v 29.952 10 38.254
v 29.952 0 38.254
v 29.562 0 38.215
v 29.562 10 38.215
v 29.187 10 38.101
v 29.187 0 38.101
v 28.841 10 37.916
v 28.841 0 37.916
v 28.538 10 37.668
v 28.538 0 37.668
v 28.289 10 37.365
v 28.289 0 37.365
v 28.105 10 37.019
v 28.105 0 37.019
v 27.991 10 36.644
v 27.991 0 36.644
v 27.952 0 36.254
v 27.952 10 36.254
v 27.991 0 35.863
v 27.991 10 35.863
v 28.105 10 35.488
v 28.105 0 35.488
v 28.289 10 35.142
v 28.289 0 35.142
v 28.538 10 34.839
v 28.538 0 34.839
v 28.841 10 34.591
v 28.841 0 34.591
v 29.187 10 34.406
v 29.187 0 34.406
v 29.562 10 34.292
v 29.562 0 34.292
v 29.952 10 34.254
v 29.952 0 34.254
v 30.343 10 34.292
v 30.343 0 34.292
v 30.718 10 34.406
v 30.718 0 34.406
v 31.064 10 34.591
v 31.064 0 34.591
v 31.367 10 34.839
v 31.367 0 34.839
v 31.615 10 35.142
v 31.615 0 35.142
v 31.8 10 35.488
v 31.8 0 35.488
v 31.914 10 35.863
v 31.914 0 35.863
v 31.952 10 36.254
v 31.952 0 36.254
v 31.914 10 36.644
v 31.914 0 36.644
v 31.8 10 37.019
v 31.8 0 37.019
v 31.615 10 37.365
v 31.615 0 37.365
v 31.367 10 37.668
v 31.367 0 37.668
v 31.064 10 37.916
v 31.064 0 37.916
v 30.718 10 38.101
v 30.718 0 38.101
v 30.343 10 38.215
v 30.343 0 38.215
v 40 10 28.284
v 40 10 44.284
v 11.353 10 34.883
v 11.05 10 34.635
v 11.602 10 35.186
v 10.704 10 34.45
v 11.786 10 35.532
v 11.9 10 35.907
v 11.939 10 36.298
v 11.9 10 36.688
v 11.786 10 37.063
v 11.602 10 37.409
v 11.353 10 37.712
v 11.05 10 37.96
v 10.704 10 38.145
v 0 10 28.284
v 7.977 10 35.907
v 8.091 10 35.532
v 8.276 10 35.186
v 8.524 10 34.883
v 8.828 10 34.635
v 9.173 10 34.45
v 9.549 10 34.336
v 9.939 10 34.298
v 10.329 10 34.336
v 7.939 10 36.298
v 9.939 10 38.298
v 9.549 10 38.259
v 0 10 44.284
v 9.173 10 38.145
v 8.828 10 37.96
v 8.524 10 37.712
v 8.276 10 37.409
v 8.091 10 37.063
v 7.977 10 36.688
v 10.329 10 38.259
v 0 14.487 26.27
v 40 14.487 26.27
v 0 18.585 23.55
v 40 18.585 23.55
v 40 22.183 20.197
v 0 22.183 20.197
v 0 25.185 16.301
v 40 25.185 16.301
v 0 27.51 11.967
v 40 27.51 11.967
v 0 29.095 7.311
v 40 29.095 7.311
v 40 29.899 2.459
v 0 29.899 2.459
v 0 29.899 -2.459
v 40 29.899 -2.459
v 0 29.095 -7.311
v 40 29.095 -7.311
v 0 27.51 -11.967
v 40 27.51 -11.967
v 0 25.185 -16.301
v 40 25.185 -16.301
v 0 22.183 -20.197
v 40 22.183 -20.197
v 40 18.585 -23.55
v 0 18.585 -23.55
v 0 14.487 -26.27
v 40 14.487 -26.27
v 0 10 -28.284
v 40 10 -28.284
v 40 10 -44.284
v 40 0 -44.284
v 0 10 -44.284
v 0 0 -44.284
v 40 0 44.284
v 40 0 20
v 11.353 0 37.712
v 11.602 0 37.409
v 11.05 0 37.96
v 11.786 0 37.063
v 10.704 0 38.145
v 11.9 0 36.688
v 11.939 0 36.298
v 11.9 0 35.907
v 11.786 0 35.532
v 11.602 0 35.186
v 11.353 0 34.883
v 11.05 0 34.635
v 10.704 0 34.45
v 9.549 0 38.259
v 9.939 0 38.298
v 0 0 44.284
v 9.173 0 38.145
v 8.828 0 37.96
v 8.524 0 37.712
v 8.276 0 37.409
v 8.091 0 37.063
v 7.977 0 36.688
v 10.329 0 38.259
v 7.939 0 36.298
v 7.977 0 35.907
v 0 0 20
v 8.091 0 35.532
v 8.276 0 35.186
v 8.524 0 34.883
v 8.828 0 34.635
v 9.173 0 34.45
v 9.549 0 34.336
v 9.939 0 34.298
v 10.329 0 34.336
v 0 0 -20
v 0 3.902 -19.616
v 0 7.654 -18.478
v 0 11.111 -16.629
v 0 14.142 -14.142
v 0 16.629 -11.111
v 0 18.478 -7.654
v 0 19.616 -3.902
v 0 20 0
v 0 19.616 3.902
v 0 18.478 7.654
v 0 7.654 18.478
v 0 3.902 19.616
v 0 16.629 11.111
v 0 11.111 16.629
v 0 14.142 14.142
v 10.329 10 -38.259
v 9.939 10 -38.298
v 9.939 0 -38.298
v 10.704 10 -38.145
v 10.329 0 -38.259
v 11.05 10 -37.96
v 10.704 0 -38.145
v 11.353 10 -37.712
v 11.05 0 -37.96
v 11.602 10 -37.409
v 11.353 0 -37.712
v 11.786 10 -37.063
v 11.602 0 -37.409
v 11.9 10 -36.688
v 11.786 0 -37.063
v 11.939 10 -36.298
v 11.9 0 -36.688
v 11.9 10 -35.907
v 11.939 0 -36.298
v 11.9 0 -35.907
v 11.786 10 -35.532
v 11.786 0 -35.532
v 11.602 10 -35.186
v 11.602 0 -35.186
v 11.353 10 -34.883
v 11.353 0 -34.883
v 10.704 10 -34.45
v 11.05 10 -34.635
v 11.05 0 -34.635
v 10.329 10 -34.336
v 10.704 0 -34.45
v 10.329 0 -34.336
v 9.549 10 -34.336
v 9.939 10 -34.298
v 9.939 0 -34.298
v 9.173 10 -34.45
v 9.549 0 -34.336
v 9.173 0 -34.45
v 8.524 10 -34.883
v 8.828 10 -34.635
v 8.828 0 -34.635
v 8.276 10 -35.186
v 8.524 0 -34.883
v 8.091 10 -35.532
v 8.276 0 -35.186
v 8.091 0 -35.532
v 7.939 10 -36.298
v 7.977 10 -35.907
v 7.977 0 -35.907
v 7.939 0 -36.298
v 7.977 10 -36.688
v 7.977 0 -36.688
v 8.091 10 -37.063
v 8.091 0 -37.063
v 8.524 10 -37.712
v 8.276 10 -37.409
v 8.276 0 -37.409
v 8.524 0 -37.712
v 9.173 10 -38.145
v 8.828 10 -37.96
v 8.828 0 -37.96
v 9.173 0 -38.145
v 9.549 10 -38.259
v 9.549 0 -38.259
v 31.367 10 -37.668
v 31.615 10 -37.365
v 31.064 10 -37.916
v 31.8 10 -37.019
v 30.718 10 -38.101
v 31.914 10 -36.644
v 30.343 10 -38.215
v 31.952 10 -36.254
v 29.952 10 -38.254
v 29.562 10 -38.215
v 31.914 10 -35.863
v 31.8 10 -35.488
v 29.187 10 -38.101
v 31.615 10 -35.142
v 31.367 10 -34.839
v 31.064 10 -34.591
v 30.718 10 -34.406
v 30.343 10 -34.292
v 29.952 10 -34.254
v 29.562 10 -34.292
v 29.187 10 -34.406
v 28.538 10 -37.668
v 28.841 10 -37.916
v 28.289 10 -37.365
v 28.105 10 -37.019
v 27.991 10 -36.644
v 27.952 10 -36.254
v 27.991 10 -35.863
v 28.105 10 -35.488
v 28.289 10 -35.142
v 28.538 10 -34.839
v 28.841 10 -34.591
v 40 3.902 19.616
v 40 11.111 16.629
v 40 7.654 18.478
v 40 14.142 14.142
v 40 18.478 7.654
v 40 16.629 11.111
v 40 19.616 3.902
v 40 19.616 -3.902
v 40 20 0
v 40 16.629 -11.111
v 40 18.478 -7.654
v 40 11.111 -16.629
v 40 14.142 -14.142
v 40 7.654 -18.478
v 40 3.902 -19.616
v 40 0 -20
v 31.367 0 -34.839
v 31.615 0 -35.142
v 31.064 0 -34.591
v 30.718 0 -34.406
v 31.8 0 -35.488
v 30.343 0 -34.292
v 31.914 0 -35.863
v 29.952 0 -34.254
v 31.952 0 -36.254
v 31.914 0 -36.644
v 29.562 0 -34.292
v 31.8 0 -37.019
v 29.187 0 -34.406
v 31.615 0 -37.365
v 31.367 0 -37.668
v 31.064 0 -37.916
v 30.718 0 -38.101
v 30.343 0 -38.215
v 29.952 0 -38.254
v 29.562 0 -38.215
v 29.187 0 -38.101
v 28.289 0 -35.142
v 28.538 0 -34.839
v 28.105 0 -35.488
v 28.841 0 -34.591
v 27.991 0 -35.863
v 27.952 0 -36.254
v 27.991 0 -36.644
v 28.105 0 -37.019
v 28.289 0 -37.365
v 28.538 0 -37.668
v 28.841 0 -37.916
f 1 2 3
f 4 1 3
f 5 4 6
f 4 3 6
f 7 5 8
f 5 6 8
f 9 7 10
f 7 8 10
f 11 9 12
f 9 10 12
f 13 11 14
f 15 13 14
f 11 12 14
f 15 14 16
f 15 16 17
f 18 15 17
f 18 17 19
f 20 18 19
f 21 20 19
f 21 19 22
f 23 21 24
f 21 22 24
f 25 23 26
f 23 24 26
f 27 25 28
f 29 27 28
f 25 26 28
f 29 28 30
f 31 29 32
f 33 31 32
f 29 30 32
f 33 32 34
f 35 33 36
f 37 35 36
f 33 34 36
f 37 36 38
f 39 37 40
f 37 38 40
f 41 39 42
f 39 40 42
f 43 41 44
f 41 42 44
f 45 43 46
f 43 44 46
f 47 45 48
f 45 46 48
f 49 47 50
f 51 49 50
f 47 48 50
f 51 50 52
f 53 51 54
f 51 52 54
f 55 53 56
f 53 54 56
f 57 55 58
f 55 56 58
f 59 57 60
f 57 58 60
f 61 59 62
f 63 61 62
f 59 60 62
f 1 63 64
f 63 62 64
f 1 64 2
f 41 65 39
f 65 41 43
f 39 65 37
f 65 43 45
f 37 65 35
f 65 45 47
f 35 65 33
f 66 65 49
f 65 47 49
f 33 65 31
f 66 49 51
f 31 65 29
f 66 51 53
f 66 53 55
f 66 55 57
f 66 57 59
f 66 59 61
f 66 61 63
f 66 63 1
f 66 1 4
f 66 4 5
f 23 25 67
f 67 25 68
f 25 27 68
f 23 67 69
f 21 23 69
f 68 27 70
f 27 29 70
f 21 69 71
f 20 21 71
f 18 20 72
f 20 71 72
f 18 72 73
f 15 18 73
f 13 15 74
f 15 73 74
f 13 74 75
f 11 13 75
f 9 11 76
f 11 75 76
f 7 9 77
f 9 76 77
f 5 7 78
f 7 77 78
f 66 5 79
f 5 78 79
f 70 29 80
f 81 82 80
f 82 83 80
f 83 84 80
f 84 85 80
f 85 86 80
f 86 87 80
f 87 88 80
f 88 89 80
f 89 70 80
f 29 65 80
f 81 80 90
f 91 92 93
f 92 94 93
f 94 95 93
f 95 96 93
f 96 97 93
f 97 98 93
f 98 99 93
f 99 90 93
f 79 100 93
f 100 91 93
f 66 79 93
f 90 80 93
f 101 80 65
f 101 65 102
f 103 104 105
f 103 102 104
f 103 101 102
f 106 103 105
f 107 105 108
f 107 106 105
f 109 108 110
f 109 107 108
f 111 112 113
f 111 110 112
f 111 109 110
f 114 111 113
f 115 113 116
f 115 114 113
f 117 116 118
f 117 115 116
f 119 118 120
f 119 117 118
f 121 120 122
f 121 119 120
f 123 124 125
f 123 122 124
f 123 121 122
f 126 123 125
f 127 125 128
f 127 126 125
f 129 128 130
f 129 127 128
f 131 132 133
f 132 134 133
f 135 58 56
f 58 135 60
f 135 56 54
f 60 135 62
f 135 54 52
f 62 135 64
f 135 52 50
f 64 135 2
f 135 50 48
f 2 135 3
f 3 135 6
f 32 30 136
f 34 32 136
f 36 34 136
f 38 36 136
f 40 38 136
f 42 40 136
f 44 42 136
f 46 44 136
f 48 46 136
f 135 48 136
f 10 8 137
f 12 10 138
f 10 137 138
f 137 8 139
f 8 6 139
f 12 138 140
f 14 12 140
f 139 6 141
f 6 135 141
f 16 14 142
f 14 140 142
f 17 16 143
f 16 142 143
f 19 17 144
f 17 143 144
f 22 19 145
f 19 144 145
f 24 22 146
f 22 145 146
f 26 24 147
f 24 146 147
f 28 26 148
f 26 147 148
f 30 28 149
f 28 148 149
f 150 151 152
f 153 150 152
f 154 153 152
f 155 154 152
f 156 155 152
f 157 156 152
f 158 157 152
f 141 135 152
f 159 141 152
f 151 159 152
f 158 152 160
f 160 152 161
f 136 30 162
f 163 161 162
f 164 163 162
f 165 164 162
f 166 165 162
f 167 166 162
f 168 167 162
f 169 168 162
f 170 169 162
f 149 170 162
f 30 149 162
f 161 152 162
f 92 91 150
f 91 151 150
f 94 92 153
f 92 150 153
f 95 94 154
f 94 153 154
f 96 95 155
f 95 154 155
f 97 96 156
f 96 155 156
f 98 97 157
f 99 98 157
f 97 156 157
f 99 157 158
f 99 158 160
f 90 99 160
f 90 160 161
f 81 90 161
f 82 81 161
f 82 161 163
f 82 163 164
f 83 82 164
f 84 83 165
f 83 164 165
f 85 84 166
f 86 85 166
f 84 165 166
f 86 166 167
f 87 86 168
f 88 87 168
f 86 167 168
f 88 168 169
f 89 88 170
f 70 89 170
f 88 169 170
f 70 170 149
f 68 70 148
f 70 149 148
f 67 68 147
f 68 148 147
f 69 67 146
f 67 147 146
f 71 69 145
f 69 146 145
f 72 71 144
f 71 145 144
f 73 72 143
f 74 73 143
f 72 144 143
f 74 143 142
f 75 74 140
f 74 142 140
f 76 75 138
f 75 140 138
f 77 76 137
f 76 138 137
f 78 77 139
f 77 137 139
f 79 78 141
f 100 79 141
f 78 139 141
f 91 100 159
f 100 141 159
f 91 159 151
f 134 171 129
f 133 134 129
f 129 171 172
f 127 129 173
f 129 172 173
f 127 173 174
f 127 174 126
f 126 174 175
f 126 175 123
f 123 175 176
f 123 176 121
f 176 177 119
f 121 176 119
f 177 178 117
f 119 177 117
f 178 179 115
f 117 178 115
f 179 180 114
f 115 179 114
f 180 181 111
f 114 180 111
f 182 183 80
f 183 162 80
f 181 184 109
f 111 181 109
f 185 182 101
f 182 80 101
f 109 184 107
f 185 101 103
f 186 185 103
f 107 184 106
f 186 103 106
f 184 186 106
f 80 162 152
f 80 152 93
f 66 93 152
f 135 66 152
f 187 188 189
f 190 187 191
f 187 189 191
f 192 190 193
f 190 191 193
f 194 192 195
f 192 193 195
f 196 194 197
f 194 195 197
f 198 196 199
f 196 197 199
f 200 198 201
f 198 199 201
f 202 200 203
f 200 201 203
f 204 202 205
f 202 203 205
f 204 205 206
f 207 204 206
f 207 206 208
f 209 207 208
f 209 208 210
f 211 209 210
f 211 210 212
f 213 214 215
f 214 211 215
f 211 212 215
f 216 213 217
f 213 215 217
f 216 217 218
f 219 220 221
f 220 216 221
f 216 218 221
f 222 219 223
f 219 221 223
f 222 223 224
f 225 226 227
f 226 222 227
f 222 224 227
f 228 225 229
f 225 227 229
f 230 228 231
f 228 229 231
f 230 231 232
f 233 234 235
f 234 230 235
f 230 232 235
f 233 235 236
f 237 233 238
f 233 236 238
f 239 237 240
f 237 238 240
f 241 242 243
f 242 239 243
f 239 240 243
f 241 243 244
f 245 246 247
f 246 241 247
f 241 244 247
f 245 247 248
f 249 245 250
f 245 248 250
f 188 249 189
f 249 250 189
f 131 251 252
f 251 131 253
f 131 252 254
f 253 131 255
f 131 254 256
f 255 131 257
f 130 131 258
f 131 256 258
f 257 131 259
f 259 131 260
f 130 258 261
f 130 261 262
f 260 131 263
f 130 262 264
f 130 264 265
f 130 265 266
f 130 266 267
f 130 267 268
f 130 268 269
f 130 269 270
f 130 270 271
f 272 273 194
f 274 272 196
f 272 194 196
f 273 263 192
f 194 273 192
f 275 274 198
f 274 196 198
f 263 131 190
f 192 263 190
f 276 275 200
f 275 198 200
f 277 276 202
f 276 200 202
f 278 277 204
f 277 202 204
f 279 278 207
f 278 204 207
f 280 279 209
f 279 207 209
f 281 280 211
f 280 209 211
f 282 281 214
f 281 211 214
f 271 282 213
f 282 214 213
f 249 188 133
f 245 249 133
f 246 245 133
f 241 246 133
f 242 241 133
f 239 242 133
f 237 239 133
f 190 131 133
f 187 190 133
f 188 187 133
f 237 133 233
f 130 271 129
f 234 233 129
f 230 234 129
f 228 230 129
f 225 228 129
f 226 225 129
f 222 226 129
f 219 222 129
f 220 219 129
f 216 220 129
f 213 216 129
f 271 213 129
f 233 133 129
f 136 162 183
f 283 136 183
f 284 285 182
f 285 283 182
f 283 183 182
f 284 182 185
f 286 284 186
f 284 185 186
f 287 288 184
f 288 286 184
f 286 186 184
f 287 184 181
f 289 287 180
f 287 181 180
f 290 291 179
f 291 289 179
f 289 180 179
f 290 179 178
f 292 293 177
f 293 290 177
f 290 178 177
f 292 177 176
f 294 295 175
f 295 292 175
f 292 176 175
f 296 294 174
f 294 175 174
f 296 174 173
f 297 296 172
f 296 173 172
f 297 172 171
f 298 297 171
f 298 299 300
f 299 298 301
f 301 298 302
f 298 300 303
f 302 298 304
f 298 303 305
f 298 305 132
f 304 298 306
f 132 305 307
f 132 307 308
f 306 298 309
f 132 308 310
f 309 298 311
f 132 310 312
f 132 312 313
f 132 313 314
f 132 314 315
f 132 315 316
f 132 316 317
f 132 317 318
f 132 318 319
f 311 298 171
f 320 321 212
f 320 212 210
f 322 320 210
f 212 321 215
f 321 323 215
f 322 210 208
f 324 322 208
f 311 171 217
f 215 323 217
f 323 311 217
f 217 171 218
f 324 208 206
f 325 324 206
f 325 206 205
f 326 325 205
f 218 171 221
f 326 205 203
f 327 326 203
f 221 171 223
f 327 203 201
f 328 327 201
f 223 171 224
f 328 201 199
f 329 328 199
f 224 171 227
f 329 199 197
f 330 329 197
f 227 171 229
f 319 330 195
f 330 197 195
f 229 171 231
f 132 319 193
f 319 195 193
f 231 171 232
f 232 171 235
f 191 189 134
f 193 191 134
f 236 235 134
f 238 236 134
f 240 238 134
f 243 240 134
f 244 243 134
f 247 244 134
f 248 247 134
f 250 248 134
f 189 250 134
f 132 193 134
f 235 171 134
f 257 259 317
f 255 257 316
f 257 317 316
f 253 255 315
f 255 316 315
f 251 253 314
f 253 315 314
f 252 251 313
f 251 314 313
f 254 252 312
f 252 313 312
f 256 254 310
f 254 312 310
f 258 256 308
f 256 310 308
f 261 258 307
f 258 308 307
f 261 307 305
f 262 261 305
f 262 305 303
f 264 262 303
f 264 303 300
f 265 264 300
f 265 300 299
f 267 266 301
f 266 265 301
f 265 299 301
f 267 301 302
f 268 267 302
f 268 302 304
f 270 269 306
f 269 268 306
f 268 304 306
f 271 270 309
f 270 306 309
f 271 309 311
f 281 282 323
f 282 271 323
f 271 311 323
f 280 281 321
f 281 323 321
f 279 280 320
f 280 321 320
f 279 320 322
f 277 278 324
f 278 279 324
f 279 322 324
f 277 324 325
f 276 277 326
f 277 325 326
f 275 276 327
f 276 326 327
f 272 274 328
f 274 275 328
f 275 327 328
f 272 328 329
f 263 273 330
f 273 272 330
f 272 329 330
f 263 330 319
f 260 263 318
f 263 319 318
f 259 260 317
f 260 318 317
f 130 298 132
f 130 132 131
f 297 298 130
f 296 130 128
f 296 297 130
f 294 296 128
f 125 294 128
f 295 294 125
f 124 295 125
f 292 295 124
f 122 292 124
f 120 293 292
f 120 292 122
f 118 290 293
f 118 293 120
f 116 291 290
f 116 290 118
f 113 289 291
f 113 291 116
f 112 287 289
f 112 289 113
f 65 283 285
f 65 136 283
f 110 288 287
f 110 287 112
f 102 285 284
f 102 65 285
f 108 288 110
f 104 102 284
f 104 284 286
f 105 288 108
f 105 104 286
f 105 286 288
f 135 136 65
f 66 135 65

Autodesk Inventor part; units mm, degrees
ref_plane "YZ Plane" through (0, 0, 0) normal (1, 0, 0) x (0, 1, 0)
ref_plane "XZ Plane" through (0, 0, 0) normal (0, 1, 0) x (-1, 0, 0)
ref_plane "XY Plane" through (0, 0, 0) normal (0, 0, 1) x (1, 0, 0)
sketch "Sketch1" plane through (0, 0, 0) normal (1, 0, 0) x (0, 1, 0)
  arc A0 (0, -20) -> (0, 20) centre (0, 0) ccw
  arc A1 (10, -28.2843) -> (10, 28.2843) centre (0, 0) ccw
  line L0 (10, 44.2843) -> (0, 44.2843)
  line L1 (0, -44.2843) -> (10, -44.2843)
  line L2 (10, -44.2843) -> (10, -28.2843)
  line L3 (10, 28.2843) -> (10, 44.2843)
  line L4 (0, 44.2843) -> (0, 20)
  line L5 (0, -20) -> (0, -44.2843)
  line L6 (0, 44.2843) -> (0, 20)
  line L7 (0, -20) -> (0, -44.2843)
  dimension "d2" = 30
  dimension "d3" = 20
  dimension "d5" = 10
  dimension "d6" = 10
  dimension "d11" = 16
  dimension "d12" = 16
extrude "Extrusion1" add sketch "Sketch1" along normal blind 40
sketch "Sketch4" plane through (0, 10, 44.2843) normal (0, 1, 0) x (1, 0, 0)
  line L0 (0, 0) -> (0, 24.2843) construction
  line L1 (0, 8) -> (0, -32) construction
  line L2 (0, 8) -> (40.1355, 8) construction
  line L3 (0, 0) -> (40, 0) projected
  line L4 (10, 0) -> (-6, 0)
  line L5 (10, 0) -> (10, 16.0426) construction
  line L6 (30, 0) -> (30, 16) construction
  line L7 (0, 16) -> (40, 16) projected
  point P0 (0, 44.2843)
  dimension "d13" = 40
  dimension "d14" = 16
sketch "Sketch5" plane through (0, 10, 44.2843) normal (0, 1, 0) x (1, 0, 0)
  point P0 (0, 44.2843)
  point P1 (9.9387, 7.9868)
  point P2 (29.9524, 8.0308)
hole "Hole1" at (9.9387, 10, 36.2975) at (29.9524, 10, 36.2535) direction (0, -1, 0) diameter 4 end through all
thread "Thread1" size "M4x0.7" class "6H" standard "ANSI Metric M Profile" length 150
thread "Thread2" size "M4x0.7" class "6H" standard "ANSI Metric M Profile" length 150
mirror "Mirror1" about plane through (0, 0, 0) normal (0, 0, 1) of "Hole1"
thread "Thread3" size "M4x0.7" class "6H" standard "ANSI Metric M Profile" length 150
thread "Thread4" size "M4x0.7" class "6H" standard "ANSI Metric M Profile" length 150
properties part number "U_bracket"
